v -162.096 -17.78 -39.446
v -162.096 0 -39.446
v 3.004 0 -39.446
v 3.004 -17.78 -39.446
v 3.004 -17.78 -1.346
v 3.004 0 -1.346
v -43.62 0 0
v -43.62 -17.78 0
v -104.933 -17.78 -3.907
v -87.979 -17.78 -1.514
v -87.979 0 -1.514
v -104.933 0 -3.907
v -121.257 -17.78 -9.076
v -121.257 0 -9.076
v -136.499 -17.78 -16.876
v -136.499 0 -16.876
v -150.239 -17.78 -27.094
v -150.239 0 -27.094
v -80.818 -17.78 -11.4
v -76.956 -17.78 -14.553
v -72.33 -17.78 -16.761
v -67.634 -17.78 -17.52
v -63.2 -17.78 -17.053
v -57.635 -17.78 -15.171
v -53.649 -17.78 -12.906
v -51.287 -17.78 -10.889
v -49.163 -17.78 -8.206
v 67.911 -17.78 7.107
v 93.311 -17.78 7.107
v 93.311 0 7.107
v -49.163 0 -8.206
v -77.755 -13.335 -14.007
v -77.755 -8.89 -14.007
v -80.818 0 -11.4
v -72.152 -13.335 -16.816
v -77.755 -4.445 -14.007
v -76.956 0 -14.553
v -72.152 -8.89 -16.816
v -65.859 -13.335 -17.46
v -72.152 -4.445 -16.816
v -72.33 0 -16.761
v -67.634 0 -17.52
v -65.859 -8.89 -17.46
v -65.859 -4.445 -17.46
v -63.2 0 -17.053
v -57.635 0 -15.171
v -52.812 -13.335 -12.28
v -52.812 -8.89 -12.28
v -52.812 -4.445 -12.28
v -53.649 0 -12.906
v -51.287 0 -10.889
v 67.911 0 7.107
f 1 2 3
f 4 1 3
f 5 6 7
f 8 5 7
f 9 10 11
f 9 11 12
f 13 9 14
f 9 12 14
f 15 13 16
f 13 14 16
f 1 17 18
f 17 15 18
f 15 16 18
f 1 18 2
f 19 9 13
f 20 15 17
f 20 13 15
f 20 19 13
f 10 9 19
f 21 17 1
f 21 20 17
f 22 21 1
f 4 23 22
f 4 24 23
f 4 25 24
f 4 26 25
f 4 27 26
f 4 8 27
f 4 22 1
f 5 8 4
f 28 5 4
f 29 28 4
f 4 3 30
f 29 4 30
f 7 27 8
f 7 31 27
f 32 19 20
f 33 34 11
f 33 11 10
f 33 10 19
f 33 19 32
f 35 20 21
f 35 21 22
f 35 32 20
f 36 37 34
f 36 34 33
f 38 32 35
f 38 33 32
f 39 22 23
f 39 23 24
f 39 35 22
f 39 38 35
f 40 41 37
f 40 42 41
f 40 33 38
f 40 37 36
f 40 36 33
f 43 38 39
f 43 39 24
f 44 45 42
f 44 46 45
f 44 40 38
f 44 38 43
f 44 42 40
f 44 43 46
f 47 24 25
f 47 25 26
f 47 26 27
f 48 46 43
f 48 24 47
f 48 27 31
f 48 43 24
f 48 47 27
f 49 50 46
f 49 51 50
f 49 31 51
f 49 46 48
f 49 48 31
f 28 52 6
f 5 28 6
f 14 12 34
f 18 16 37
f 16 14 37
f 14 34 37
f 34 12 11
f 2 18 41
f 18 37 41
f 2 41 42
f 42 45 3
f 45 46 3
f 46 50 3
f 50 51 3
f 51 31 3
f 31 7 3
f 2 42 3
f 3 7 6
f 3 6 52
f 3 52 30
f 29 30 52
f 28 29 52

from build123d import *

# Parameters (mm, degrees)
F1_DEPTH    = 17.78
F2_T1_DEPTH = 417.7319430625


# Not quite as in the source:
# - a fillet or chamfer that OpenCascade refuses, or shapes differently, is made with other operations: its cross-section is extruded or revolved along the edge and cut away or added


with BuildPart() as f1:
    # F0 (on Front) → F1 (new body)
    with BuildSketch(Plane.XZ):
        with BuildLine():
            Line((-162.0961189375, -1.346105228), (-162.0961189375, -39.446105228))
            Line((-162.0961189375, -39.446105228), (3.0038810625, -39.446105228))
            Line((3.0038810625, -39.446105228), (93.3108132751, 7.1072834172))
            Line((93.3108132751, 7.1072834172), (67.9108132751, 7.1072834172))
            Line((67.9108132751, 7.1072834172), (3.0038810625, -1.346105228))
            Line((3.0038810625, -1.346105228), (-43.6204448342, 0))
            add(Edge.make_bspline(
                [(-88.0704448342, -1.346105228), (-85.1866431635, -6.6508062653), (-78.8098016913, -15.013308036), (-66.0558603131, -19.2294666036), (-50.4728148138, -12.3489722112), (-48.5910698771, -6.9073382765), (-43.6204448342, 0)],
                knots=[0, 0, 0, 0, 0.2654455487, 0.4966311992, 0.7427406625, 1, 1, 1, 1], degree=3))
            Line((-88.0704448342, -1.346105228), (-162.0961189375, -1.346105228))
        make_face()
    extrude(amount=F1_DEPTH)

    # F2: fillet of radius 103.0193211336 on 1 edges, made by hand

    # F2_s2 → F2_t1 (cut)
    with BuildSketch(Plane.XZ.offset(-199.9759715313)):
        with BuildLine():
            ThreePointArc((-82.105730325, -1.346105228), (-126.4060471139, -11.3575640099), (-162.0961189375, -39.446105228))
            Line((-162.0961189375, -39.446105228), (-162.0961189375, -1.346105228))
            Line((-162.0961189375, -1.346105228), (-82.105730325, -1.346105228))
        make_face()
    extrude(amount=F2_T1_DEPTH, mode=Mode.SUBTRACT)


solid = f1.part
